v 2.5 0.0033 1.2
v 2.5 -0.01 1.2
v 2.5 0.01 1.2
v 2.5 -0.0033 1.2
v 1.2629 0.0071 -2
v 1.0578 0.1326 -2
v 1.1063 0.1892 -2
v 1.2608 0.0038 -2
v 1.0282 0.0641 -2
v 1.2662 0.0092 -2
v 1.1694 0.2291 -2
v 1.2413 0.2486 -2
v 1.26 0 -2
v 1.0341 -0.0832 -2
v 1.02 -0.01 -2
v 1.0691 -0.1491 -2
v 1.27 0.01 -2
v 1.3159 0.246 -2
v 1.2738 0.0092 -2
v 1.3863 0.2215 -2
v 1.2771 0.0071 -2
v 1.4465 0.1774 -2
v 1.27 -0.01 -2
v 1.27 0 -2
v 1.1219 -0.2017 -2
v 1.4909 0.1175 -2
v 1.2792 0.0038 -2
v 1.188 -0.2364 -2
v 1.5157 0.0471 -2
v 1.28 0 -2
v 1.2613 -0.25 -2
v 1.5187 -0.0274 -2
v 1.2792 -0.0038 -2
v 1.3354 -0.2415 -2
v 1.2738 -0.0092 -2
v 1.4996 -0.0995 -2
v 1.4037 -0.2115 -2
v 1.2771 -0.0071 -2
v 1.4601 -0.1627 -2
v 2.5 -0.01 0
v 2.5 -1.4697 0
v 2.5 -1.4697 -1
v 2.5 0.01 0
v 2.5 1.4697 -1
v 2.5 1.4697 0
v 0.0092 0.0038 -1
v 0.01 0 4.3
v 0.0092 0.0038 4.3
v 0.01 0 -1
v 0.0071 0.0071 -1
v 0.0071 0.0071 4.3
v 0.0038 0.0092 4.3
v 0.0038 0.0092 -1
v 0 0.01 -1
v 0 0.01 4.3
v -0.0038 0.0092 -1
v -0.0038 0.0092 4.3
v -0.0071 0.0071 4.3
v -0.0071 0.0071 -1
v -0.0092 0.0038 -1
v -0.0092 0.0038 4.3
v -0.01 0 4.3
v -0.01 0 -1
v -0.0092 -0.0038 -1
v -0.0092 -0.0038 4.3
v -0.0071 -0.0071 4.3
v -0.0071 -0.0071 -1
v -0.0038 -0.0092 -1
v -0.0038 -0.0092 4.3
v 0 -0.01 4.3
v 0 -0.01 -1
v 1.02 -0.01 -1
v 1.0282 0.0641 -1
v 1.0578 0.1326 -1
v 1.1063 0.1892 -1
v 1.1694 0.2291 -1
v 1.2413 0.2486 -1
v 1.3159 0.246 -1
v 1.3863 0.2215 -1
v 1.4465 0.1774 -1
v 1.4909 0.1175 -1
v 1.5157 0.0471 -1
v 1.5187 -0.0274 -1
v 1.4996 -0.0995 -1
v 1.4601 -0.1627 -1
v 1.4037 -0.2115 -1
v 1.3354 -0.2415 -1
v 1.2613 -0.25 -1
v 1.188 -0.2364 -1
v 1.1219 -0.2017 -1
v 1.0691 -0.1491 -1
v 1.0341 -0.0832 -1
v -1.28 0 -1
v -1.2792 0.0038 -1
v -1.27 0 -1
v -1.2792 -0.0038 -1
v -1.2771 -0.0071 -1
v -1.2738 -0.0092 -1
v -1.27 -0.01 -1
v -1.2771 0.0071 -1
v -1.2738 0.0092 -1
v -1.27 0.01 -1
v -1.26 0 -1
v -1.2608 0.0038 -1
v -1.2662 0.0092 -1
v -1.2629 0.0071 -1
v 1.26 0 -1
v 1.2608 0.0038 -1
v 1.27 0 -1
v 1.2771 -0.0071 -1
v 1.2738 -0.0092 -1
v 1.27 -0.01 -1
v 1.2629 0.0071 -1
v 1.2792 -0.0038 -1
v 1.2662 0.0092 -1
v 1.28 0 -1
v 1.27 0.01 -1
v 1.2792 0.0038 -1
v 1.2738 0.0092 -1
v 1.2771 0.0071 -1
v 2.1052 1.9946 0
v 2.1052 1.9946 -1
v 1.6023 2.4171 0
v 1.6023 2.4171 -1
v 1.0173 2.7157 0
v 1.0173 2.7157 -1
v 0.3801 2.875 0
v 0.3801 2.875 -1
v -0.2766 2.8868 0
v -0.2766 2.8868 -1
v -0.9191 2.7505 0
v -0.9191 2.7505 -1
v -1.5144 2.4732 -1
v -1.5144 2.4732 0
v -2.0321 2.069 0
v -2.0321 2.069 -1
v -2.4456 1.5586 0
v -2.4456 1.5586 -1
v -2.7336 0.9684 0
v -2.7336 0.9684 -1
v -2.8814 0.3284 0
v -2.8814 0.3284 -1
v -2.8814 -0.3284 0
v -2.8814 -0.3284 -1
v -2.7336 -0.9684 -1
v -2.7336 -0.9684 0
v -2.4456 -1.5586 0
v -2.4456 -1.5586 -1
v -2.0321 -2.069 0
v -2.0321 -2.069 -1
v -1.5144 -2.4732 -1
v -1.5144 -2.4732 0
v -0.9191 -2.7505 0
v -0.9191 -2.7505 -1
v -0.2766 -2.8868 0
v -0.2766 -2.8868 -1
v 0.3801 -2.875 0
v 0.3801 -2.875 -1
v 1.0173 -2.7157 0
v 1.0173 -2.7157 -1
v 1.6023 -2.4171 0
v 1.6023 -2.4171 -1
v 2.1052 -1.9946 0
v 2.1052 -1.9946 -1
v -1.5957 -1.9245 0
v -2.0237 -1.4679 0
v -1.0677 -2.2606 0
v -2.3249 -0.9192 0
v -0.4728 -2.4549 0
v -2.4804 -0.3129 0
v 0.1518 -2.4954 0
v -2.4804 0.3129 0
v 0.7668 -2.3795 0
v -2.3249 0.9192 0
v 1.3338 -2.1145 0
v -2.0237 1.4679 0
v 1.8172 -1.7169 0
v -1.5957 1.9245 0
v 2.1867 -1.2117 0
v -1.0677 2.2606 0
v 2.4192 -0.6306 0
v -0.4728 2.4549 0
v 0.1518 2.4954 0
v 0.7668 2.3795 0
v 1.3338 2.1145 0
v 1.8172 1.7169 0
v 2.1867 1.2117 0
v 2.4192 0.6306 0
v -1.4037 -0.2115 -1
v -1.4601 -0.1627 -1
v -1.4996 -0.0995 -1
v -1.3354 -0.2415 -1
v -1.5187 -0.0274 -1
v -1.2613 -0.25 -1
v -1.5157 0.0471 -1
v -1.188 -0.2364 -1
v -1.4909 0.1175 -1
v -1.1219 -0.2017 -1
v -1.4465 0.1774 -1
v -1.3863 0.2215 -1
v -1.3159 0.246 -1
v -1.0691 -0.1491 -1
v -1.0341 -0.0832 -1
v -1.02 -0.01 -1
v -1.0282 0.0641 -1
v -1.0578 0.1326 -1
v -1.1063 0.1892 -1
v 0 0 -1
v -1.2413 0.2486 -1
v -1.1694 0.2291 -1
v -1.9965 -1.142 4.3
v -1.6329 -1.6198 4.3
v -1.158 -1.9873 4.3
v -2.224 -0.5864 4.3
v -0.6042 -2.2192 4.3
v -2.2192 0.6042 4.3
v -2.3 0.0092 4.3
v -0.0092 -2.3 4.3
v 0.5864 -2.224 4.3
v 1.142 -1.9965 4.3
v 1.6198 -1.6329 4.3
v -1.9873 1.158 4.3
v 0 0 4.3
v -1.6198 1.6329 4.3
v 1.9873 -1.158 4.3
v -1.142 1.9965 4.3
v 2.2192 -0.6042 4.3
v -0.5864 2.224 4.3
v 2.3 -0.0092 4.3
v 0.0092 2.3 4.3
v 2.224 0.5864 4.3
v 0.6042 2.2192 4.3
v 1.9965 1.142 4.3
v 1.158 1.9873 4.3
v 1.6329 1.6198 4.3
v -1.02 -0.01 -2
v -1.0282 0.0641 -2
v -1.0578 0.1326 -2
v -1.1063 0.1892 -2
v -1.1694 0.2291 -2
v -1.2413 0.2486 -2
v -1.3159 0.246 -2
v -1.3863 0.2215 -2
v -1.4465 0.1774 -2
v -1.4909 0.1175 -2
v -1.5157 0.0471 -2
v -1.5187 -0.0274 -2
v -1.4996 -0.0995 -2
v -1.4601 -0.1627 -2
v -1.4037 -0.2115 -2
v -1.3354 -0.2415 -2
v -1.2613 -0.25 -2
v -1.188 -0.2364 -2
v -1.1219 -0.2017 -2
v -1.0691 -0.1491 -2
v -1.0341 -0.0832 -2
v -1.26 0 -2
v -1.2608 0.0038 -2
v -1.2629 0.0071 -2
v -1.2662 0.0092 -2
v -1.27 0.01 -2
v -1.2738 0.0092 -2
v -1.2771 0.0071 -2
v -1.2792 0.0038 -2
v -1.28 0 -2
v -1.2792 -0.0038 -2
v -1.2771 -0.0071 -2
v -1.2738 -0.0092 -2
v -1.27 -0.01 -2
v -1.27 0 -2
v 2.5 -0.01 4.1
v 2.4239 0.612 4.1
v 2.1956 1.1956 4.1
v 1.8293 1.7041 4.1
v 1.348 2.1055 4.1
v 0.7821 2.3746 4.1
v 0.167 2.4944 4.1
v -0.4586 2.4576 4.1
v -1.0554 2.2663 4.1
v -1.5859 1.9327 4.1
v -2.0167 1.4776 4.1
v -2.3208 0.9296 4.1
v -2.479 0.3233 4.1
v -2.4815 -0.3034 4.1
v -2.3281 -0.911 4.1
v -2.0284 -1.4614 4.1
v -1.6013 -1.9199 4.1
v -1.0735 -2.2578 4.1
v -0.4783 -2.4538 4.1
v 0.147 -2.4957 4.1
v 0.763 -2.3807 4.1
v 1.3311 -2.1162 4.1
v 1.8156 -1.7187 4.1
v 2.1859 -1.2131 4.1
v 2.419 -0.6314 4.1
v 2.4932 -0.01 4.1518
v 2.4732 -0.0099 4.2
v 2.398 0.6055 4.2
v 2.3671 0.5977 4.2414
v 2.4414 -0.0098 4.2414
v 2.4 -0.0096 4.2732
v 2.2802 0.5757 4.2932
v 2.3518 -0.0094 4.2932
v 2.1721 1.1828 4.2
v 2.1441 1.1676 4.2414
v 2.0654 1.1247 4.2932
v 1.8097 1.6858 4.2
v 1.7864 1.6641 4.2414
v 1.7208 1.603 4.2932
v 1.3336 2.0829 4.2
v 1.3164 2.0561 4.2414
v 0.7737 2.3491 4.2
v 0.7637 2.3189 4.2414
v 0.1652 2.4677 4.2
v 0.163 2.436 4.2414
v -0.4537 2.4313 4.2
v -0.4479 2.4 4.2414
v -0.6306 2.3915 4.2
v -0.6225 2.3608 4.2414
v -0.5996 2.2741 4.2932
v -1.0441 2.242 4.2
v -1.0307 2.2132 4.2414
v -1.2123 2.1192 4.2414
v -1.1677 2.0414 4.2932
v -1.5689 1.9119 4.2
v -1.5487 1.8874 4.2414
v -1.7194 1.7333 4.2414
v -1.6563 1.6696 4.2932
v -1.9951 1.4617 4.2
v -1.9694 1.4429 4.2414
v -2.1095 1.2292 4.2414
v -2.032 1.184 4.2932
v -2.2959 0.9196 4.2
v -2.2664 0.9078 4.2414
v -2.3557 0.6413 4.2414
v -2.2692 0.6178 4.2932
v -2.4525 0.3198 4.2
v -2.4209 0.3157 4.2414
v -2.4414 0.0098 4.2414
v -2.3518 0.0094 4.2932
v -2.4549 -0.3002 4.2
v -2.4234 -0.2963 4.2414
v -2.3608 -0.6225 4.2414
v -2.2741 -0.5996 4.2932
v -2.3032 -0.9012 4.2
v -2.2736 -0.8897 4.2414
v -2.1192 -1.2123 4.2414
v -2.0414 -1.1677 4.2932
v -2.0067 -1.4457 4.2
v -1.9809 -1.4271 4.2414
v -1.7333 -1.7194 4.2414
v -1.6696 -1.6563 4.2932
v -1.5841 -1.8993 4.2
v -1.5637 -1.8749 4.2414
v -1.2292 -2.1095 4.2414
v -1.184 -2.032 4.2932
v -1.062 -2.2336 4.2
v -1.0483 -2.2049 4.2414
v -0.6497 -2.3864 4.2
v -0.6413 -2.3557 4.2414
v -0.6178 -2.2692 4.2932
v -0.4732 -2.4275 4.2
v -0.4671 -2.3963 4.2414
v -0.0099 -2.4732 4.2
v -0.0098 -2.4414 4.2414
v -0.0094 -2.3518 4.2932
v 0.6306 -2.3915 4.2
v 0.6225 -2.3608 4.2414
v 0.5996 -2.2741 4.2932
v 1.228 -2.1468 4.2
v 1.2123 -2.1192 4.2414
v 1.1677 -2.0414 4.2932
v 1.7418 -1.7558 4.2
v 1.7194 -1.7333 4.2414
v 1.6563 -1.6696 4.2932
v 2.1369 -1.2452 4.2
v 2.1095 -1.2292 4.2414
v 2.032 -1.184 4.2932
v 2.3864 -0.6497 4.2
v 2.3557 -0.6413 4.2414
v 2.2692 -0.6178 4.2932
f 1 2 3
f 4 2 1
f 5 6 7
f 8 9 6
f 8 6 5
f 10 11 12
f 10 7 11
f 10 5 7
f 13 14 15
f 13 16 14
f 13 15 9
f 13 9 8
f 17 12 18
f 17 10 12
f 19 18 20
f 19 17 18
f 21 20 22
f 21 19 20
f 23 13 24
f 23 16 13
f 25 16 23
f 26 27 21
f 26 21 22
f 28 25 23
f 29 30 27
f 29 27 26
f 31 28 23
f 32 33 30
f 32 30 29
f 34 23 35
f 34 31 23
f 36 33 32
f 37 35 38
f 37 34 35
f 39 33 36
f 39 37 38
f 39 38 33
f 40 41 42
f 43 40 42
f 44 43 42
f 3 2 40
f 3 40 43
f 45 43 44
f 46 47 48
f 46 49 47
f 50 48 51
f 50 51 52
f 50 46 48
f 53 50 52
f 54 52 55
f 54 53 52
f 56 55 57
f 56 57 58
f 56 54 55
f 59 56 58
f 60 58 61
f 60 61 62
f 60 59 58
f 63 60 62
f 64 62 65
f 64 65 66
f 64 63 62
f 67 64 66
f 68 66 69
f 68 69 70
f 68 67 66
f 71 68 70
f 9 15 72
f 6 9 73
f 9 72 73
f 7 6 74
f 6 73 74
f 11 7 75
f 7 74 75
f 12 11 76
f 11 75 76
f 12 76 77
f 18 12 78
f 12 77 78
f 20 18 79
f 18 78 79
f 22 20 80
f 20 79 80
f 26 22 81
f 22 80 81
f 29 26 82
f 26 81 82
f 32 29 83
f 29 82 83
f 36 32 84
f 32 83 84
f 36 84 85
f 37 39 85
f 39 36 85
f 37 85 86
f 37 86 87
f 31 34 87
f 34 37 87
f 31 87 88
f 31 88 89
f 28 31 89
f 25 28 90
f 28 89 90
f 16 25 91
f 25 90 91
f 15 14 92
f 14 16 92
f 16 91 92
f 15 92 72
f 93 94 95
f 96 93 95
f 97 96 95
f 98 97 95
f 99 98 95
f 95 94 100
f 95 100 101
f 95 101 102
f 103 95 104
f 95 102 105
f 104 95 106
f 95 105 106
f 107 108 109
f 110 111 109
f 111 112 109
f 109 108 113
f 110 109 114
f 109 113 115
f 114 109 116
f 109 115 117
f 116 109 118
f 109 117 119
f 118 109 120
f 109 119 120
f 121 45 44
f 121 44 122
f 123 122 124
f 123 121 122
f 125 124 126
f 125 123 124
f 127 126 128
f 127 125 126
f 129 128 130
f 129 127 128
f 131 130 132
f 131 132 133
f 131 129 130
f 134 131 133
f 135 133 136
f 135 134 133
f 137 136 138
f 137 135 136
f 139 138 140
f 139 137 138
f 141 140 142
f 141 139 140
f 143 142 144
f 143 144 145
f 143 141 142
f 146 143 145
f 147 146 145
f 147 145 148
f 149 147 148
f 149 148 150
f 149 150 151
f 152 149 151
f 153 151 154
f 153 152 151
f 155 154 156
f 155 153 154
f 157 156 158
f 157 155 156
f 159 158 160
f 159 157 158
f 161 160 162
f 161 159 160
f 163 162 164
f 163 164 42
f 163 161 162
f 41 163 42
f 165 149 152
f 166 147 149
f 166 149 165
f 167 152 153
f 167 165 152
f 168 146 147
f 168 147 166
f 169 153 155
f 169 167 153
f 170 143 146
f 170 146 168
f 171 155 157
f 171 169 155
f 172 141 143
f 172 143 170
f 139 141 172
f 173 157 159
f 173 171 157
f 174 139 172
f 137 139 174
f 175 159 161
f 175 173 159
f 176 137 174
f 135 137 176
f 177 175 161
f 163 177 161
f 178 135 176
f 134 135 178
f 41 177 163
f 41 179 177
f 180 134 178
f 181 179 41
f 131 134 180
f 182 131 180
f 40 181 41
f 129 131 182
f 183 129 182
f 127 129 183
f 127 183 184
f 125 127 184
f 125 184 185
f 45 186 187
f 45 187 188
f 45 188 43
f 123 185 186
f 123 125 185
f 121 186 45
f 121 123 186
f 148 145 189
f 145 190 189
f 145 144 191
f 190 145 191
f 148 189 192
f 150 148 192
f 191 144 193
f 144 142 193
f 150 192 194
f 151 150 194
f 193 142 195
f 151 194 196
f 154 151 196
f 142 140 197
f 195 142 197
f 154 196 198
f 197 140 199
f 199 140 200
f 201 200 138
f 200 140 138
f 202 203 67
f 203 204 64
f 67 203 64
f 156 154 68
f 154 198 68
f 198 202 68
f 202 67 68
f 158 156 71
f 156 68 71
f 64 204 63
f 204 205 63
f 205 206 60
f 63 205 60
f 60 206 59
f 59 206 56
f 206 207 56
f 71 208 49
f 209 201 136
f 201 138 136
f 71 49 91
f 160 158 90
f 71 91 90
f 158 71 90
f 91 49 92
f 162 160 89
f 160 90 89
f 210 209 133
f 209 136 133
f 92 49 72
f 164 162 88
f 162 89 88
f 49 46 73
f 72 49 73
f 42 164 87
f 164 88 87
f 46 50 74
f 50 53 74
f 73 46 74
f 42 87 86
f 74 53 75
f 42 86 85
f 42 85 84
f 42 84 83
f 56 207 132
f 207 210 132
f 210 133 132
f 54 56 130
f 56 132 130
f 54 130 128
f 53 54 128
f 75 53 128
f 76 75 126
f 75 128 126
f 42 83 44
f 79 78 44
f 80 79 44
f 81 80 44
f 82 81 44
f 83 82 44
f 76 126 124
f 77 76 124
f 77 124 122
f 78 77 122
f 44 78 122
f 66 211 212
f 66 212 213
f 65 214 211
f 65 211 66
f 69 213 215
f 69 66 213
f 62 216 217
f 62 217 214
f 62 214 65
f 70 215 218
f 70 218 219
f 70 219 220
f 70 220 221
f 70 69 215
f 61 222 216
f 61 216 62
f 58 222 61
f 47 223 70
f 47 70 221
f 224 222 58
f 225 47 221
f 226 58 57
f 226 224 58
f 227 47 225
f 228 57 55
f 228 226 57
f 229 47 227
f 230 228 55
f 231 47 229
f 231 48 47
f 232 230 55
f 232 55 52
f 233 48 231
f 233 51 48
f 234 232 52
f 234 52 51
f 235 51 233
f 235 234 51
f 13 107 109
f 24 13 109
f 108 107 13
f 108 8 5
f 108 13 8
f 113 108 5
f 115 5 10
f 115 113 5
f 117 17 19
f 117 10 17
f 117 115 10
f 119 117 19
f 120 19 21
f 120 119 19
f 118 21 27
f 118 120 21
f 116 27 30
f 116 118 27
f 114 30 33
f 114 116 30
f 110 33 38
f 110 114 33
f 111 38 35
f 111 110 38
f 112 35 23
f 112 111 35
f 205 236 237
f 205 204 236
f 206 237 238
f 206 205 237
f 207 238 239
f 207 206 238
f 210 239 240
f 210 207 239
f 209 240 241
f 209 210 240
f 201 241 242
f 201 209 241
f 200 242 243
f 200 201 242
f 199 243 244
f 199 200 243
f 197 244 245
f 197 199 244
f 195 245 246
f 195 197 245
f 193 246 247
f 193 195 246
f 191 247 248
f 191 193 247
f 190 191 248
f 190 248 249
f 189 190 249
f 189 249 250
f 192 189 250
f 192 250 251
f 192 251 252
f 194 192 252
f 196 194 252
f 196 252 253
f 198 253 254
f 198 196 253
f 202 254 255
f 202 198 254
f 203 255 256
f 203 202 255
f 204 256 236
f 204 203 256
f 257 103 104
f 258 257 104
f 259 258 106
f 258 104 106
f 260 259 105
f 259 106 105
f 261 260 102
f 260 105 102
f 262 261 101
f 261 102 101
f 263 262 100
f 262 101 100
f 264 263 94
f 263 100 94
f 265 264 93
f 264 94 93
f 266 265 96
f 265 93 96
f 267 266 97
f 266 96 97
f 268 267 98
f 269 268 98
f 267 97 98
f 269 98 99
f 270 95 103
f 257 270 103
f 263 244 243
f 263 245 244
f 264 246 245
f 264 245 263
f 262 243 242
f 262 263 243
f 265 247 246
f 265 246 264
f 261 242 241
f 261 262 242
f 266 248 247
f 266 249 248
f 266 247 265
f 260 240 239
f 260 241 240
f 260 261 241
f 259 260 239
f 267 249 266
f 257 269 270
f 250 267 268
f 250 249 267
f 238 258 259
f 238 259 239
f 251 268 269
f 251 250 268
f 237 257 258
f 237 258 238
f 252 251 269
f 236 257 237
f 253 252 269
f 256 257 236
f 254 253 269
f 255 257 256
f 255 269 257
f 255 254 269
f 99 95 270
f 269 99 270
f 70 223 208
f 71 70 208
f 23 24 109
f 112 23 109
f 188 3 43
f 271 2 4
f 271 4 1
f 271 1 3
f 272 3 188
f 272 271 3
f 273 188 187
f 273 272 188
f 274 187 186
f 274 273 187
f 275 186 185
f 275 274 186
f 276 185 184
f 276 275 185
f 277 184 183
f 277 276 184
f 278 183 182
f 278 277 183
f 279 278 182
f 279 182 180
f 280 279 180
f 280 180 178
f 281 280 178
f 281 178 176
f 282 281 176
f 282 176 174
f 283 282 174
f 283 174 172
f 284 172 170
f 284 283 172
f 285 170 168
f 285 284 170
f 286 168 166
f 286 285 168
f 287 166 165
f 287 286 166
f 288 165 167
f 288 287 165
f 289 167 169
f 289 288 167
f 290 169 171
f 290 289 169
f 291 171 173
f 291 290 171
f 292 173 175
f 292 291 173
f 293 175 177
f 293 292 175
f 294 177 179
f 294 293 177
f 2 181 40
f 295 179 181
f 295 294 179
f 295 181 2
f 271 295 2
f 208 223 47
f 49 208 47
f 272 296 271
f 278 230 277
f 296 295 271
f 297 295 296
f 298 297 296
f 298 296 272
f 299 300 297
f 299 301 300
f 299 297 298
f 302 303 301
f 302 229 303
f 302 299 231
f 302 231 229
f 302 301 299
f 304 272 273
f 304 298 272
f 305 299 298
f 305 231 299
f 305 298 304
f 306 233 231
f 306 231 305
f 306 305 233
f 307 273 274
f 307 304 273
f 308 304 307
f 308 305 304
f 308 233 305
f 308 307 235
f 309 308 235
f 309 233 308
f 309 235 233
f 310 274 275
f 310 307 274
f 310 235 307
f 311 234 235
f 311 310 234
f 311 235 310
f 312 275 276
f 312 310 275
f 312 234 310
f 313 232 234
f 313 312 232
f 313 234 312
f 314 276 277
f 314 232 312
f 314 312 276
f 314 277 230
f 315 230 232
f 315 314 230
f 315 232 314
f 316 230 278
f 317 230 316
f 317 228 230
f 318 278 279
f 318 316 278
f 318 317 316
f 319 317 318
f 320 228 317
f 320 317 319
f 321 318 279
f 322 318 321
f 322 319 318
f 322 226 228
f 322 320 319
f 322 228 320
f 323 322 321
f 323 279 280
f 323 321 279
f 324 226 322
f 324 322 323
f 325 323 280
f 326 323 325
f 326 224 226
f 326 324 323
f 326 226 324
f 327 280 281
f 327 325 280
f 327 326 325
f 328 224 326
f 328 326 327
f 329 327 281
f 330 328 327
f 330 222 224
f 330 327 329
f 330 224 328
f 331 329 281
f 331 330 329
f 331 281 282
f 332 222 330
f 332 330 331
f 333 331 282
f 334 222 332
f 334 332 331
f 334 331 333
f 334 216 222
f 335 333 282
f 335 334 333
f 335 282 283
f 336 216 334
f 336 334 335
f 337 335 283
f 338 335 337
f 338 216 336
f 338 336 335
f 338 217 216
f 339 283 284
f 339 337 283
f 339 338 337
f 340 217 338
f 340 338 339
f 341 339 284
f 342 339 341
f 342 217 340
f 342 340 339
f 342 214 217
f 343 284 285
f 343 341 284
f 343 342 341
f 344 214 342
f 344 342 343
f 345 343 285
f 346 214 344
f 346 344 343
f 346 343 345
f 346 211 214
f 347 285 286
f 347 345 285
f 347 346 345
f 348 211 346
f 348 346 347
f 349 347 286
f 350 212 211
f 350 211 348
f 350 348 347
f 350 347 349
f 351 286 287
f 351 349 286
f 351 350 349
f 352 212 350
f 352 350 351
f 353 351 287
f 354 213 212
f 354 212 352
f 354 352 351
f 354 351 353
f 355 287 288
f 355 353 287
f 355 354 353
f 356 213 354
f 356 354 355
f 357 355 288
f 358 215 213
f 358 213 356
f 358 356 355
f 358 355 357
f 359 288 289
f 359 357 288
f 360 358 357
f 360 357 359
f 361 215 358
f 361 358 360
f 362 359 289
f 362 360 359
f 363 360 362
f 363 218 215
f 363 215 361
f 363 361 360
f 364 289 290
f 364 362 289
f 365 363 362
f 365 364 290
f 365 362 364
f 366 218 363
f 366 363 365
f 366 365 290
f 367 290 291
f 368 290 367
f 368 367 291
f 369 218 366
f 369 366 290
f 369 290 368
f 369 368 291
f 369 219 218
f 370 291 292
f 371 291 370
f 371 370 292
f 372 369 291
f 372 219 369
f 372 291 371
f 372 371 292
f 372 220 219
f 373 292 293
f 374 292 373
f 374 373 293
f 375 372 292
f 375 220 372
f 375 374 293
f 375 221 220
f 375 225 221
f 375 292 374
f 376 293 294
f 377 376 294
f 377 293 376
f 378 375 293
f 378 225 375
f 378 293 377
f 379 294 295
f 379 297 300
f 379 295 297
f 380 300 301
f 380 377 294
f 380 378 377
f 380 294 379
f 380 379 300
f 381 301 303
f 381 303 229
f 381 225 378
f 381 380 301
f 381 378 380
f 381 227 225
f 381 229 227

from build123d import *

# Parameters (mm, degrees)
F0_W      = 2.5
F0_H      = 4.3
F1_DEPTH  = 0.01
F4_W      = 3
F4_H      = 2.4
F5_DEPTH  = 2
F0_W_2    = 0.25
F0_H_2    = 26.2
F6_DEPTH  = 0.01
F7_DEPTH  = 0.01
F7_FACE_W = 0.25
F7_FACE_H = 28.7
F6_FACE_W = 0.25
F6_FACE_H = 26.2
F10_R     = 0.2
F11_W     = 38
F11_H     = 33
F12_DEPTH = 12.5


with BuildPart() as f1:
    # F0 (on Front) → F1 (new body)
    with BuildSketch(Plane.XZ):
        with Locations((1.25, 2.15)):
            Rectangle(F0_W, F0_H)
        Polygon((2.5, 0), (0, 0), (0, -1), (1.02, -1), (1.27, -1), (2.9, -1), (2.9, 0), align=None)
    extrude(amount=F1_DEPTH)

    # F1_face (on face) → F2 (revolve)
    with BuildSketch(Plane(origin=(1.2924908425, -0.01, 1.586996337), x_dir=(1, 0, 0), z_dir=(0, -1, 0))):
        Polygon((-1.2924908425, 2.713003663), (-1.2924908425, -2.586996337), (1.6075091575, -2.586996337), (1.6075091575, -1.586996337), (1.2075091575, -1.586996337), (1.2075091575, 2.713003663), align=None)
    revolve(axis=Axis((0, 0, 1.65), (0, 0, 1)))

    # F4 (on offset) → F5 (cut)
    with BuildSketch(Plane.YZ.offset(2.5)):
        Rectangle(F4_W, F4_H)
    extrude(amount=F5_DEPTH, mode=Mode.SUBTRACT)

    # F0 (on Front) → F6 (join)
    with BuildSketch(Plane.XZ):
        with Locations((1.145, -14.1)):
            Rectangle(F0_W_2, F0_H_2)
    extrude(amount=F6_DEPTH)

    # F0 (on Front) → F7 (join)
    with BuildSketch(Plane.XZ):
        Polygon((-1.02, -29.7), (-1.02, -27.2), (-1.02, -1), (-1.27, -1), (-1.27, -29.7), align=None)
    extrude(amount=F7_DEPTH)

    # F7_face (on face) → F8 (revolve)
    with BuildSketch(Plane(origin=(-1.145, -0.01, -15.35), x_dir=(1, 0, 0), z_dir=(0, -1, 0))):
        Rectangle(F7_FACE_W, F7_FACE_H)
    revolve(axis=Axis((-1.27, 0, -15.35), (0, 0, 1)))

    # F6_face (on face) → F9 (revolve)
    with BuildSketch(Plane(origin=(1.145, -0.01, -14.1), x_dir=(1, 0, 0), z_dir=(0, -1, 0))):
        Rectangle(F6_FACE_W, F6_FACE_H)
    revolve(axis=Axis((1.27, 0, -14.1), (0, 0, -1)))

    # F10
    f10_edges = [f1.edges().sort_by_distance(p)[0] for p in [
        (-2.5, 0.01, 4.3),
    ]]
    fillet(f10_edges, radius=F10_R)

    # F11 (on Front) → F12 (cut, symmetric)
    with BuildSketch(Plane.XZ):
        with Locations((1.6585592992, -18.5)):
            Rectangle(F11_W, F11_H)
    extrude(amount=F12_DEPTH, both=True, mode=Mode.SUBTRACT)


solid = f1.part
